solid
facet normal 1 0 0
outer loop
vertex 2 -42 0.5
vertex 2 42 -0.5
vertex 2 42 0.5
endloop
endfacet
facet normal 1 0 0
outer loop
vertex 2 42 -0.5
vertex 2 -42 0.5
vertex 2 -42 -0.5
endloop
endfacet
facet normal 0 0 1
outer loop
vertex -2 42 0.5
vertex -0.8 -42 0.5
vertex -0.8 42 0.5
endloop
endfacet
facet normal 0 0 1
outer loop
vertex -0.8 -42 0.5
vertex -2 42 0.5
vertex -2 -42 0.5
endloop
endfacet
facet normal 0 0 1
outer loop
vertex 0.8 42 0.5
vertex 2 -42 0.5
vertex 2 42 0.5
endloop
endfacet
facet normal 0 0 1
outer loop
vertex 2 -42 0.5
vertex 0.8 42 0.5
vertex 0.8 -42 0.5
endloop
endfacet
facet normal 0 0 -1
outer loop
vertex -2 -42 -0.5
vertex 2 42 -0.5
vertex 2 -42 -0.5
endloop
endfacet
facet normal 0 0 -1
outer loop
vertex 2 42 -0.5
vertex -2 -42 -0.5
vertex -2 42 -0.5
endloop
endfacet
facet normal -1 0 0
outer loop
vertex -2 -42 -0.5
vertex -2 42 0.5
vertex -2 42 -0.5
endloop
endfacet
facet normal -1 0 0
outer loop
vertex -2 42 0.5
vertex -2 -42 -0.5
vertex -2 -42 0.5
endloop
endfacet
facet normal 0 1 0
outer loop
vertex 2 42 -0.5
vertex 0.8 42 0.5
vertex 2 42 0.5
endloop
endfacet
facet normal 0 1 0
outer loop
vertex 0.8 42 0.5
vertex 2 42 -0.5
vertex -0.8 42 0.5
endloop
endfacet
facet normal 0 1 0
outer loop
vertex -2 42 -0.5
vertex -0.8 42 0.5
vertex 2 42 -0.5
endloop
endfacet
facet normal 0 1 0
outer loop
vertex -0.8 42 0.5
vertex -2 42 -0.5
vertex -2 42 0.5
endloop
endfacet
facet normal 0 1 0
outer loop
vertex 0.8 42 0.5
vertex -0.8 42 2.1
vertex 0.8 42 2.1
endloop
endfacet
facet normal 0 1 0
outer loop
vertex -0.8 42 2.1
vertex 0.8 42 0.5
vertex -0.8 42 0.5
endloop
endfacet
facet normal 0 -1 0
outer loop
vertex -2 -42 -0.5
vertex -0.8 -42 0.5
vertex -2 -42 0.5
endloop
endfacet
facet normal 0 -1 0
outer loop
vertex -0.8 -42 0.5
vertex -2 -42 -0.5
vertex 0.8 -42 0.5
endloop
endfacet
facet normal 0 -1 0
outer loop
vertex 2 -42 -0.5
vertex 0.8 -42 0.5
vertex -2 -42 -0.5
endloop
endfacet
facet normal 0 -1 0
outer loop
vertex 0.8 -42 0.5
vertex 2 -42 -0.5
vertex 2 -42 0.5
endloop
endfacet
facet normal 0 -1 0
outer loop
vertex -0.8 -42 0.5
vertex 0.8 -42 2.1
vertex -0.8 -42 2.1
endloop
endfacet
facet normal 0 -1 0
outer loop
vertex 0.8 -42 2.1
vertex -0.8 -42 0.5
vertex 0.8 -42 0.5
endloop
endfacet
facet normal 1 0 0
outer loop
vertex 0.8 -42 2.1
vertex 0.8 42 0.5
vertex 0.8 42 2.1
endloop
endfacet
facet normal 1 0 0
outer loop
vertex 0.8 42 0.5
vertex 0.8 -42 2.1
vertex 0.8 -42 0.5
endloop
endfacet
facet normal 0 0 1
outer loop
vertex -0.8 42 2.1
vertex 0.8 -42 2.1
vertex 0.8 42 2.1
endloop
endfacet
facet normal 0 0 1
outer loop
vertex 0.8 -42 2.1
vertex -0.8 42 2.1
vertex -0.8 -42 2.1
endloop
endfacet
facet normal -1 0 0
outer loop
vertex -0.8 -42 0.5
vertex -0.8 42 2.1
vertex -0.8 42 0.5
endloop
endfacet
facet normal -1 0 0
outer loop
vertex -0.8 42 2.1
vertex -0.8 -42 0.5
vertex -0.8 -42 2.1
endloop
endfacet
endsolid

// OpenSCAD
// ==========================================
// Xentient Interior — Alignment Keyway Strips
// Glue onto inner hex wall for angular orientation
// ==========================================
// Print count: 3 (at 0°, 120°, 240°)
// Glue position: inner wall at 0°, 120°, 240°
// Glue zone: full height Z=3 to Z=87
// Adhesive: cyanoacrylate on flat back, scuff wall first
// Per Framework §7: vertical alignment grooves
// Units: mm

$fn = 32;

Key_W      = 1.6;      // Keyway strip width (matches plate groove)
Key_H      = 1.6;      // Keyway strip height (protrusion from wall)
Key_Length = 84.0;     // Z=3 to Z=87 (full interior height minus floor/ceiling)
Key_Base_T = 1.0;      // Base strip thickness (glue surface)
Key_Base_W = 4.0;      // Base strip width

module keyway_strip() {
    // Flat base (glue surface)
    cube([Key_Base_W, Key_Length, Key_Base_T], center=true);

    // Raised key ridge (plates have matching groove)
    translate([0, 0, Key_Base_T/2 + Key_H/2])
        cube([Key_W, Key_Length, Key_H], center=true);
}

// Render single strip (print 3)
keyway_strip();
